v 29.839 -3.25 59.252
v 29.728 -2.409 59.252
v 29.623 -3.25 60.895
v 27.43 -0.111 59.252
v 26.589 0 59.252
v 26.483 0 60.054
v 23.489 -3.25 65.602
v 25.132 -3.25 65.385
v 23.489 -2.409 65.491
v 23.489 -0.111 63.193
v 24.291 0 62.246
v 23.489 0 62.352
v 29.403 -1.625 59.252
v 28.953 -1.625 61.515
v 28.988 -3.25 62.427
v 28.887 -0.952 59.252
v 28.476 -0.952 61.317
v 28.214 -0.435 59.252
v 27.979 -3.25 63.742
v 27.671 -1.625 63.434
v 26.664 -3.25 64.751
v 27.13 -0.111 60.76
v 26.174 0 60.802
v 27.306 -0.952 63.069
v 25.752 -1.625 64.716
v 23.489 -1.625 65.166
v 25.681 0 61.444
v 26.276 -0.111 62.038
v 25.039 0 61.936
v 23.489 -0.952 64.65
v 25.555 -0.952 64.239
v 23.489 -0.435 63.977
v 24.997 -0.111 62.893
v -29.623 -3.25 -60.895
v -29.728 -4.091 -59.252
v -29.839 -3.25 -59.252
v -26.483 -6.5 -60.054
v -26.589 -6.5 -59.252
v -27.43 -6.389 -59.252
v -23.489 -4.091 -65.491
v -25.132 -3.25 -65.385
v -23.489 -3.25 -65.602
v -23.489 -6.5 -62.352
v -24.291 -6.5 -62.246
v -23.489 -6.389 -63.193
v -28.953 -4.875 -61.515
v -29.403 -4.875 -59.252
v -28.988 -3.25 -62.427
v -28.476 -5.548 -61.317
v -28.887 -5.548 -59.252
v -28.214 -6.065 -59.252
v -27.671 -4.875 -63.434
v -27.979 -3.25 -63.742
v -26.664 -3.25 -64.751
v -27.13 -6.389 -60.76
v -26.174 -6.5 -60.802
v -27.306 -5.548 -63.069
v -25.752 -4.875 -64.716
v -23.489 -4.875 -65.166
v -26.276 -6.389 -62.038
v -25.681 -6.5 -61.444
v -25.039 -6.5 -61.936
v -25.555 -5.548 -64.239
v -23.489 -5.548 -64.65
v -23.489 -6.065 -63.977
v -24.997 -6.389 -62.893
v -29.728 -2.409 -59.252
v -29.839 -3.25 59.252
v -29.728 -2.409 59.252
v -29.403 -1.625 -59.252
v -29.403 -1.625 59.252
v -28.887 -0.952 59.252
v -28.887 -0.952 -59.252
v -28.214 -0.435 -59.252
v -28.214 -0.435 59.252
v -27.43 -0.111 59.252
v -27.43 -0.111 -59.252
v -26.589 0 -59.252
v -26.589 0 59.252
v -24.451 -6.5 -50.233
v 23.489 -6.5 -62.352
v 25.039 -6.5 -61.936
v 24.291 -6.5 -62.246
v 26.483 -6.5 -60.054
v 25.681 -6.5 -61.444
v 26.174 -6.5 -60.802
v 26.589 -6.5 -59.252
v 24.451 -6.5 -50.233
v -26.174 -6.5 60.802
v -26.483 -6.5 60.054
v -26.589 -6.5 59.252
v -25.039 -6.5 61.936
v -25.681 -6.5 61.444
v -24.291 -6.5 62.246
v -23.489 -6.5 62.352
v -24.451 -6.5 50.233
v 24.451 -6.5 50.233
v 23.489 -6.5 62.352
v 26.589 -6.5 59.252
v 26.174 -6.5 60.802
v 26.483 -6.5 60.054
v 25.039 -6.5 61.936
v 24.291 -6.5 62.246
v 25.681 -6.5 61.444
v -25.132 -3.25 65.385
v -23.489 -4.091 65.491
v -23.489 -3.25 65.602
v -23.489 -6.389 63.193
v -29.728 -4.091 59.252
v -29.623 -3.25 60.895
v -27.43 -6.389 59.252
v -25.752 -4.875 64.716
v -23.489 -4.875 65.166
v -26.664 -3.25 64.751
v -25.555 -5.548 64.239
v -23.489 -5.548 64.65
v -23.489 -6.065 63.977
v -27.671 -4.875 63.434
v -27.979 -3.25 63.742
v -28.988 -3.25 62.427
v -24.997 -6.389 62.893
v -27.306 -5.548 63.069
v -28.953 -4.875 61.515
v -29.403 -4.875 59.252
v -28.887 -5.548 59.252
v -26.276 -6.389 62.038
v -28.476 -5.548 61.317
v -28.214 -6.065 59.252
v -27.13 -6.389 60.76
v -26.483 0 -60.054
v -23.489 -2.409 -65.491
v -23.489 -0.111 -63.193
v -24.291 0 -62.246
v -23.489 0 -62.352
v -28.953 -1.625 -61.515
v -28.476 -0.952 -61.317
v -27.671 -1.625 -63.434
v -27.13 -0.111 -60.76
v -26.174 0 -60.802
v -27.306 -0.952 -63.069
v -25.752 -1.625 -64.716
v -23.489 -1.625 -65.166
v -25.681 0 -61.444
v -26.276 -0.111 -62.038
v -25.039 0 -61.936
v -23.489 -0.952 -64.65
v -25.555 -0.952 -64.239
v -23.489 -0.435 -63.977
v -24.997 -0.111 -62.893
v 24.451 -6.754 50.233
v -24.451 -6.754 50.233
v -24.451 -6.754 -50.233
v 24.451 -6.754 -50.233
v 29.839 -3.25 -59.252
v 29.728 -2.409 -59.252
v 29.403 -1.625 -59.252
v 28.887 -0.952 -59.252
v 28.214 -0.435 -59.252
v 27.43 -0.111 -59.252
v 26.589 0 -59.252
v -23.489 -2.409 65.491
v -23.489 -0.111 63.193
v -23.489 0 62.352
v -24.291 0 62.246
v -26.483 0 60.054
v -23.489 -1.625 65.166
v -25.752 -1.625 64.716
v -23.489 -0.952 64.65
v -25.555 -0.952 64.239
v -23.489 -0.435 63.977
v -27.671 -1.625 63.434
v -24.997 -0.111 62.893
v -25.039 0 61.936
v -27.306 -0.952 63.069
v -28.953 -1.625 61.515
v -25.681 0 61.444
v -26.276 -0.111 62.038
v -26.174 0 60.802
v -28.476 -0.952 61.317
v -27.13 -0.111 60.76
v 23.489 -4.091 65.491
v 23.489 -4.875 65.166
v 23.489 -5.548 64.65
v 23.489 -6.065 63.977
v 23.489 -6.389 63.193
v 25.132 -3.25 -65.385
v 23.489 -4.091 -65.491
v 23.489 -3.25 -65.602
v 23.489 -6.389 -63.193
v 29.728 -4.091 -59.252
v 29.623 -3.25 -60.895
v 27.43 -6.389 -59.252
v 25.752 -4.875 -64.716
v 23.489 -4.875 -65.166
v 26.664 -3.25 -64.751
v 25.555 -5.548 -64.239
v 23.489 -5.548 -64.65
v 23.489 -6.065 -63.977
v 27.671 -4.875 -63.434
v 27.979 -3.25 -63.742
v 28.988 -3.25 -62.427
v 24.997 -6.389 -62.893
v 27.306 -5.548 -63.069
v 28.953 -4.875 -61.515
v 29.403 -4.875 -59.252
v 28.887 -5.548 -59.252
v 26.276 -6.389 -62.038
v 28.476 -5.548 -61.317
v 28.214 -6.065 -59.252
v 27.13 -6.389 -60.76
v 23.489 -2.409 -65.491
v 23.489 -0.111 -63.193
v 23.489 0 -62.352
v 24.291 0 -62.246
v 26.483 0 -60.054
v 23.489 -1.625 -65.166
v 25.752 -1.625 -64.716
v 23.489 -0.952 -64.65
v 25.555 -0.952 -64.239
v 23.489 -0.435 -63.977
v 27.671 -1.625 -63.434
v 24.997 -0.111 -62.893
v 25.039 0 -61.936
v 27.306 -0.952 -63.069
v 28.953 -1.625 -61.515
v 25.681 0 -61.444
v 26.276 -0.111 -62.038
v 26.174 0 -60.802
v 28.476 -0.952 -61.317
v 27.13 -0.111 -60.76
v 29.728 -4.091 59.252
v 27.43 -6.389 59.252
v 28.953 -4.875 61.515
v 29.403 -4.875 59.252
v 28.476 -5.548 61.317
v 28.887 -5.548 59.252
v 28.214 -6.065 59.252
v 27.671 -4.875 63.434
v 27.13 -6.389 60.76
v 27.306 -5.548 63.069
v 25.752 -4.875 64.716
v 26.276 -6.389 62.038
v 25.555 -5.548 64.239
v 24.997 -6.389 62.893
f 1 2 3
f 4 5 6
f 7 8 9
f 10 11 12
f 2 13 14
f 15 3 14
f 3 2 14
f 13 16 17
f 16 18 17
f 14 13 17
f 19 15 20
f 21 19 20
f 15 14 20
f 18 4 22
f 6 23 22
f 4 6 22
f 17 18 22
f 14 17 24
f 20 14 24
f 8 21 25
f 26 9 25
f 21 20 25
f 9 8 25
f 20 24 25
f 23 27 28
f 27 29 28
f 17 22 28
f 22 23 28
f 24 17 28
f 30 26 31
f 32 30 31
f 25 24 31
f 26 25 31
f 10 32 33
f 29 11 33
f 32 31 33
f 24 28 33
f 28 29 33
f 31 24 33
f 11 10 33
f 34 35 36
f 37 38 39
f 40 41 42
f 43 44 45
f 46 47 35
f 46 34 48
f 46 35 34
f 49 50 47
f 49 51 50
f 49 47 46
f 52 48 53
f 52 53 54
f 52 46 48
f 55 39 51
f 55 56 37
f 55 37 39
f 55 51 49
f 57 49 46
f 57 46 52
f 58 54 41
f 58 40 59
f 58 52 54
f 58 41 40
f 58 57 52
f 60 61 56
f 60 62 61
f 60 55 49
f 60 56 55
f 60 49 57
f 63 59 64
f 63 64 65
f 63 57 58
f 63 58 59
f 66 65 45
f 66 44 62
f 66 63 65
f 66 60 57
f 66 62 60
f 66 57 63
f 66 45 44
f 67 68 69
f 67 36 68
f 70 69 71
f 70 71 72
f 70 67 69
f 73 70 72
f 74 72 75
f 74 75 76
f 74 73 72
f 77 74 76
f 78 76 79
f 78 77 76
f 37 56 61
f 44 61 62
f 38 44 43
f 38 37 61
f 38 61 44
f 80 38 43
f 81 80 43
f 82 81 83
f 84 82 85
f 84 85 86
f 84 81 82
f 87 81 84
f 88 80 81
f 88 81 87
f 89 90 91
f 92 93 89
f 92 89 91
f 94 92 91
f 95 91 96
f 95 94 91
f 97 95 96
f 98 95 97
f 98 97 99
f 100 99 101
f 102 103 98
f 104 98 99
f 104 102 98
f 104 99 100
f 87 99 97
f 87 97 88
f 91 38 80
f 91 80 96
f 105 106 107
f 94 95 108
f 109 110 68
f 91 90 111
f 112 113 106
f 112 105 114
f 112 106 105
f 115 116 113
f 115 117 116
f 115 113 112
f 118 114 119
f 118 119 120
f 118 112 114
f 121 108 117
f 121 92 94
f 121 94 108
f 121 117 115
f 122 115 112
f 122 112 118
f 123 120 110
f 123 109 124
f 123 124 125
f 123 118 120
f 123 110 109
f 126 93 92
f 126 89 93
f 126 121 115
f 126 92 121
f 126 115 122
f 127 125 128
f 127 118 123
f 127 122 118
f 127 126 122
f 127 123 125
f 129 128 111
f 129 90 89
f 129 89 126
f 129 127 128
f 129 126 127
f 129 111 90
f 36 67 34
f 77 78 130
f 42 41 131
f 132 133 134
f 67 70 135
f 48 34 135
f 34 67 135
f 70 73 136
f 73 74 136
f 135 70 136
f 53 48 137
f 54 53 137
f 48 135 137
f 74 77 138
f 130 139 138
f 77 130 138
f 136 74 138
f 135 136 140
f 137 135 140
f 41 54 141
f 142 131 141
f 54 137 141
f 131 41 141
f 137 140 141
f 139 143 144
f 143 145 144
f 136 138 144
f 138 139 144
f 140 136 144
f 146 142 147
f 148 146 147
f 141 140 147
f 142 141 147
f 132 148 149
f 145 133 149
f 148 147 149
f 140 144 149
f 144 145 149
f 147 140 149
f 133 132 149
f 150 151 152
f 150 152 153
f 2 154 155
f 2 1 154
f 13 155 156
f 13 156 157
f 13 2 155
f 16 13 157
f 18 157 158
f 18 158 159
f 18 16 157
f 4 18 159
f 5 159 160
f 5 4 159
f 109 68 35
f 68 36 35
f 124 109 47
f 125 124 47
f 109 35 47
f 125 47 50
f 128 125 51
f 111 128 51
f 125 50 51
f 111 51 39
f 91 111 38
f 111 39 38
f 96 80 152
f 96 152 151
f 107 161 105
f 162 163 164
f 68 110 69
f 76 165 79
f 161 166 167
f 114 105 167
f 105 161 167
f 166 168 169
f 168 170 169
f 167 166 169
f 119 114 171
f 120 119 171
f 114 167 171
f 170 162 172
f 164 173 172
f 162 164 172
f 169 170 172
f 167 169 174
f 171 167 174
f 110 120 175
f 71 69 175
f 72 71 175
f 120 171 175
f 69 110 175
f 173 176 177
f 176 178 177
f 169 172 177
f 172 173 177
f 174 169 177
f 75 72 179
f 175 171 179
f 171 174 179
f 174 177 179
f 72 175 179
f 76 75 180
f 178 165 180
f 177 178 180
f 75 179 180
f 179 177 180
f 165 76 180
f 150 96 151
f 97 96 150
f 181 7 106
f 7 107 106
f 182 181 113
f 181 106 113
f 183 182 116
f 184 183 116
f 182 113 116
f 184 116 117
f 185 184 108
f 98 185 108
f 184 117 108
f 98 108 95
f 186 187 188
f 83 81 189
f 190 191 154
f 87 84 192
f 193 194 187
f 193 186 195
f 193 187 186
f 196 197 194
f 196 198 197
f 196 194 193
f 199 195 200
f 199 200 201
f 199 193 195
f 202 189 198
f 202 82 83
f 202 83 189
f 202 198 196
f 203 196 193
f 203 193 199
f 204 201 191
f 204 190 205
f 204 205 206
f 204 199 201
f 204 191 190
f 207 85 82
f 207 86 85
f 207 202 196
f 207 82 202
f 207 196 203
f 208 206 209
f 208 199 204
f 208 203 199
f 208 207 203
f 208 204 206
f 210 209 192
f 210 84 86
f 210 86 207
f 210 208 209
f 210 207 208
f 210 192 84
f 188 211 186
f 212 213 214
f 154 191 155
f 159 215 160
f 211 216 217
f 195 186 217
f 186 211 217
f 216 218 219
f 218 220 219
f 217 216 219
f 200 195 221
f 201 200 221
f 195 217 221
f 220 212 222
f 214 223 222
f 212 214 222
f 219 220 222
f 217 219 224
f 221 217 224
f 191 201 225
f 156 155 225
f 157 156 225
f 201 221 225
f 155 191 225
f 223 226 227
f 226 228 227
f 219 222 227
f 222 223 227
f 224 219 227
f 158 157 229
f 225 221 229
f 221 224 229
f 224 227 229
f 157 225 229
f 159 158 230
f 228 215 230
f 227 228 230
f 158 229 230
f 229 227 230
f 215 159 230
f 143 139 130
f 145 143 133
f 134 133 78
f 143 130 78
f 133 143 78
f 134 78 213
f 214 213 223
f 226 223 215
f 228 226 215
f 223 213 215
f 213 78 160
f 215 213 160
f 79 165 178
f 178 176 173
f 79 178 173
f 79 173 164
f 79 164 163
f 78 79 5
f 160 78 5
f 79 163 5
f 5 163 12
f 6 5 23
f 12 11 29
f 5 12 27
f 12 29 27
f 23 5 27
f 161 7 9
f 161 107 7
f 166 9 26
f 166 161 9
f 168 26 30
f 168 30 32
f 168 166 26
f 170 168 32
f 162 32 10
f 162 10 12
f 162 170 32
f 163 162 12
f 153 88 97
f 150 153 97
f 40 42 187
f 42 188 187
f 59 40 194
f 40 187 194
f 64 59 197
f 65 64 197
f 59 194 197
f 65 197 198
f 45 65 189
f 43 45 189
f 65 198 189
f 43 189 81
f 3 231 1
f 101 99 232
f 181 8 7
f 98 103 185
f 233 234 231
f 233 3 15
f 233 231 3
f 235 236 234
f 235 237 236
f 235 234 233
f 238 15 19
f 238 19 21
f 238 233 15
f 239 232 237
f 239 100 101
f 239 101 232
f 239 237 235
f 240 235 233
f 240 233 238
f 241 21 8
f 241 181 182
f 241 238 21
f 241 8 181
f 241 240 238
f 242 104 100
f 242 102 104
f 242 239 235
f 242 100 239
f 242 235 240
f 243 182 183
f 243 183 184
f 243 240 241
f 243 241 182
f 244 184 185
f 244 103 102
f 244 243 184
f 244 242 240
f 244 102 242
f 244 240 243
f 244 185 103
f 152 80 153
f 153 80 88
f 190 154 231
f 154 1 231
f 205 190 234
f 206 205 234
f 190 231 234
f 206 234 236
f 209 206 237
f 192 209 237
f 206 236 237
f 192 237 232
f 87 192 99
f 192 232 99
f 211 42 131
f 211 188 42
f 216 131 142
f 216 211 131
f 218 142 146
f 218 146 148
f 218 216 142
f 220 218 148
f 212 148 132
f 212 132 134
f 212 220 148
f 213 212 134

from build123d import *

# Parameters (mm, degrees)
F1_DEPTH = 6.5
F2_R     = 3.24999
F5_R     = 4.1935700789
F6_DEPTH = 0.254
F7_W     = 48.9017218351
F7_H     = 100.4664152861
F8_DEPTH = 0.254


# Not quite as in the source:
# - a fillet or chamfer is up to 0.001 mm smaller than in the source, because OpenCascade refuses the exact size
# - the program builds the solid bodies; features that only make, move or delete a surface that nothing else refers to are left out


with BuildPart() as f1:
    # F0 (on Front) → F1 (new body)
    with BuildSketch(Plane.XZ):
        with BuildLine():
            ThreePointArc((29.8388717587, 59.2516543508), (27.9789998192, 63.7417824113), (23.4888717587, 65.6016543508))
            Line((23.4888717587, 65.6016543508), (-23.4888717587, 65.6016543508))
            ThreePointArc((-23.4888717587, 65.6016543508), (-27.9789998192, 63.7417824113), (-29.8388717587, 59.2516543508))
            Line((-29.8388717587, 59.2516543508), (-29.8388717587, -59.2516543508))
            ThreePointArc((-29.8388717587, -59.2516543508), (-27.9789998192, -63.7417824113), (-23.4888717587, -65.6016543508))
            Line((-23.4888717587, -65.6016543508), (23.4888717587, -65.6016543508))
            ThreePointArc((23.4888717587, -65.6016543508), (27.9789998192, -63.7417824113), (29.8388717587, -59.2516543508))
            Line((29.8388717587, -59.2516543508), (29.8388717587, 59.2516543508))
        make_face()
    extrude(amount=F1_DEPTH)

    # F2 (radius 3.25 in the source; OpenCascade refuses exactly that, so slightly less here)
    f2_edges = [f1.edges().sort_by_distance(p)[0] for p in [
        (29.838872, 0, 0),
        (29.838872, -6.5, 0),
        (-29.838872, -6.5, 0),
        (0, 0, 65.601654),
        (0, -6.5, 65.601654),
        (-27.979, -6.5, 63.741782),
        (-27.979, 0, 63.741782),
        (27.979, -6.5, 63.741782),
        (27.979, 0, 63.741782),
        (27.979, -6.5, -63.741782),
        (0, -6.5, -65.601654),
        (-27.979, -6.5, -63.741782),
        (27.979, 0, -63.741782),
        (0, 0, -65.601654),
        (-27.979, 0, -63.741782),
        (-29.838872, -3.25, 59.251654),
        (-29.838872, -3.25, -59.251654),
        (-29.838872, 0, 0),
    ]]
    fillet(f2_edges, radius=F2_R)

    # F5 (on Front) → F6 (join)
    with BuildSketch(Plane.XZ):
        with Locations((0, -55.7777807117)):
            Circle(F5_R)
    extrude(amount=F6_DEPTH)

    # F7 (on face) → F8 (join)
    with BuildSketch(Plane.XZ.offset(6.5)):
        Rectangle(F7_W, F7_H)
    extrude(amount=F8_DEPTH)


solid = f1.part
